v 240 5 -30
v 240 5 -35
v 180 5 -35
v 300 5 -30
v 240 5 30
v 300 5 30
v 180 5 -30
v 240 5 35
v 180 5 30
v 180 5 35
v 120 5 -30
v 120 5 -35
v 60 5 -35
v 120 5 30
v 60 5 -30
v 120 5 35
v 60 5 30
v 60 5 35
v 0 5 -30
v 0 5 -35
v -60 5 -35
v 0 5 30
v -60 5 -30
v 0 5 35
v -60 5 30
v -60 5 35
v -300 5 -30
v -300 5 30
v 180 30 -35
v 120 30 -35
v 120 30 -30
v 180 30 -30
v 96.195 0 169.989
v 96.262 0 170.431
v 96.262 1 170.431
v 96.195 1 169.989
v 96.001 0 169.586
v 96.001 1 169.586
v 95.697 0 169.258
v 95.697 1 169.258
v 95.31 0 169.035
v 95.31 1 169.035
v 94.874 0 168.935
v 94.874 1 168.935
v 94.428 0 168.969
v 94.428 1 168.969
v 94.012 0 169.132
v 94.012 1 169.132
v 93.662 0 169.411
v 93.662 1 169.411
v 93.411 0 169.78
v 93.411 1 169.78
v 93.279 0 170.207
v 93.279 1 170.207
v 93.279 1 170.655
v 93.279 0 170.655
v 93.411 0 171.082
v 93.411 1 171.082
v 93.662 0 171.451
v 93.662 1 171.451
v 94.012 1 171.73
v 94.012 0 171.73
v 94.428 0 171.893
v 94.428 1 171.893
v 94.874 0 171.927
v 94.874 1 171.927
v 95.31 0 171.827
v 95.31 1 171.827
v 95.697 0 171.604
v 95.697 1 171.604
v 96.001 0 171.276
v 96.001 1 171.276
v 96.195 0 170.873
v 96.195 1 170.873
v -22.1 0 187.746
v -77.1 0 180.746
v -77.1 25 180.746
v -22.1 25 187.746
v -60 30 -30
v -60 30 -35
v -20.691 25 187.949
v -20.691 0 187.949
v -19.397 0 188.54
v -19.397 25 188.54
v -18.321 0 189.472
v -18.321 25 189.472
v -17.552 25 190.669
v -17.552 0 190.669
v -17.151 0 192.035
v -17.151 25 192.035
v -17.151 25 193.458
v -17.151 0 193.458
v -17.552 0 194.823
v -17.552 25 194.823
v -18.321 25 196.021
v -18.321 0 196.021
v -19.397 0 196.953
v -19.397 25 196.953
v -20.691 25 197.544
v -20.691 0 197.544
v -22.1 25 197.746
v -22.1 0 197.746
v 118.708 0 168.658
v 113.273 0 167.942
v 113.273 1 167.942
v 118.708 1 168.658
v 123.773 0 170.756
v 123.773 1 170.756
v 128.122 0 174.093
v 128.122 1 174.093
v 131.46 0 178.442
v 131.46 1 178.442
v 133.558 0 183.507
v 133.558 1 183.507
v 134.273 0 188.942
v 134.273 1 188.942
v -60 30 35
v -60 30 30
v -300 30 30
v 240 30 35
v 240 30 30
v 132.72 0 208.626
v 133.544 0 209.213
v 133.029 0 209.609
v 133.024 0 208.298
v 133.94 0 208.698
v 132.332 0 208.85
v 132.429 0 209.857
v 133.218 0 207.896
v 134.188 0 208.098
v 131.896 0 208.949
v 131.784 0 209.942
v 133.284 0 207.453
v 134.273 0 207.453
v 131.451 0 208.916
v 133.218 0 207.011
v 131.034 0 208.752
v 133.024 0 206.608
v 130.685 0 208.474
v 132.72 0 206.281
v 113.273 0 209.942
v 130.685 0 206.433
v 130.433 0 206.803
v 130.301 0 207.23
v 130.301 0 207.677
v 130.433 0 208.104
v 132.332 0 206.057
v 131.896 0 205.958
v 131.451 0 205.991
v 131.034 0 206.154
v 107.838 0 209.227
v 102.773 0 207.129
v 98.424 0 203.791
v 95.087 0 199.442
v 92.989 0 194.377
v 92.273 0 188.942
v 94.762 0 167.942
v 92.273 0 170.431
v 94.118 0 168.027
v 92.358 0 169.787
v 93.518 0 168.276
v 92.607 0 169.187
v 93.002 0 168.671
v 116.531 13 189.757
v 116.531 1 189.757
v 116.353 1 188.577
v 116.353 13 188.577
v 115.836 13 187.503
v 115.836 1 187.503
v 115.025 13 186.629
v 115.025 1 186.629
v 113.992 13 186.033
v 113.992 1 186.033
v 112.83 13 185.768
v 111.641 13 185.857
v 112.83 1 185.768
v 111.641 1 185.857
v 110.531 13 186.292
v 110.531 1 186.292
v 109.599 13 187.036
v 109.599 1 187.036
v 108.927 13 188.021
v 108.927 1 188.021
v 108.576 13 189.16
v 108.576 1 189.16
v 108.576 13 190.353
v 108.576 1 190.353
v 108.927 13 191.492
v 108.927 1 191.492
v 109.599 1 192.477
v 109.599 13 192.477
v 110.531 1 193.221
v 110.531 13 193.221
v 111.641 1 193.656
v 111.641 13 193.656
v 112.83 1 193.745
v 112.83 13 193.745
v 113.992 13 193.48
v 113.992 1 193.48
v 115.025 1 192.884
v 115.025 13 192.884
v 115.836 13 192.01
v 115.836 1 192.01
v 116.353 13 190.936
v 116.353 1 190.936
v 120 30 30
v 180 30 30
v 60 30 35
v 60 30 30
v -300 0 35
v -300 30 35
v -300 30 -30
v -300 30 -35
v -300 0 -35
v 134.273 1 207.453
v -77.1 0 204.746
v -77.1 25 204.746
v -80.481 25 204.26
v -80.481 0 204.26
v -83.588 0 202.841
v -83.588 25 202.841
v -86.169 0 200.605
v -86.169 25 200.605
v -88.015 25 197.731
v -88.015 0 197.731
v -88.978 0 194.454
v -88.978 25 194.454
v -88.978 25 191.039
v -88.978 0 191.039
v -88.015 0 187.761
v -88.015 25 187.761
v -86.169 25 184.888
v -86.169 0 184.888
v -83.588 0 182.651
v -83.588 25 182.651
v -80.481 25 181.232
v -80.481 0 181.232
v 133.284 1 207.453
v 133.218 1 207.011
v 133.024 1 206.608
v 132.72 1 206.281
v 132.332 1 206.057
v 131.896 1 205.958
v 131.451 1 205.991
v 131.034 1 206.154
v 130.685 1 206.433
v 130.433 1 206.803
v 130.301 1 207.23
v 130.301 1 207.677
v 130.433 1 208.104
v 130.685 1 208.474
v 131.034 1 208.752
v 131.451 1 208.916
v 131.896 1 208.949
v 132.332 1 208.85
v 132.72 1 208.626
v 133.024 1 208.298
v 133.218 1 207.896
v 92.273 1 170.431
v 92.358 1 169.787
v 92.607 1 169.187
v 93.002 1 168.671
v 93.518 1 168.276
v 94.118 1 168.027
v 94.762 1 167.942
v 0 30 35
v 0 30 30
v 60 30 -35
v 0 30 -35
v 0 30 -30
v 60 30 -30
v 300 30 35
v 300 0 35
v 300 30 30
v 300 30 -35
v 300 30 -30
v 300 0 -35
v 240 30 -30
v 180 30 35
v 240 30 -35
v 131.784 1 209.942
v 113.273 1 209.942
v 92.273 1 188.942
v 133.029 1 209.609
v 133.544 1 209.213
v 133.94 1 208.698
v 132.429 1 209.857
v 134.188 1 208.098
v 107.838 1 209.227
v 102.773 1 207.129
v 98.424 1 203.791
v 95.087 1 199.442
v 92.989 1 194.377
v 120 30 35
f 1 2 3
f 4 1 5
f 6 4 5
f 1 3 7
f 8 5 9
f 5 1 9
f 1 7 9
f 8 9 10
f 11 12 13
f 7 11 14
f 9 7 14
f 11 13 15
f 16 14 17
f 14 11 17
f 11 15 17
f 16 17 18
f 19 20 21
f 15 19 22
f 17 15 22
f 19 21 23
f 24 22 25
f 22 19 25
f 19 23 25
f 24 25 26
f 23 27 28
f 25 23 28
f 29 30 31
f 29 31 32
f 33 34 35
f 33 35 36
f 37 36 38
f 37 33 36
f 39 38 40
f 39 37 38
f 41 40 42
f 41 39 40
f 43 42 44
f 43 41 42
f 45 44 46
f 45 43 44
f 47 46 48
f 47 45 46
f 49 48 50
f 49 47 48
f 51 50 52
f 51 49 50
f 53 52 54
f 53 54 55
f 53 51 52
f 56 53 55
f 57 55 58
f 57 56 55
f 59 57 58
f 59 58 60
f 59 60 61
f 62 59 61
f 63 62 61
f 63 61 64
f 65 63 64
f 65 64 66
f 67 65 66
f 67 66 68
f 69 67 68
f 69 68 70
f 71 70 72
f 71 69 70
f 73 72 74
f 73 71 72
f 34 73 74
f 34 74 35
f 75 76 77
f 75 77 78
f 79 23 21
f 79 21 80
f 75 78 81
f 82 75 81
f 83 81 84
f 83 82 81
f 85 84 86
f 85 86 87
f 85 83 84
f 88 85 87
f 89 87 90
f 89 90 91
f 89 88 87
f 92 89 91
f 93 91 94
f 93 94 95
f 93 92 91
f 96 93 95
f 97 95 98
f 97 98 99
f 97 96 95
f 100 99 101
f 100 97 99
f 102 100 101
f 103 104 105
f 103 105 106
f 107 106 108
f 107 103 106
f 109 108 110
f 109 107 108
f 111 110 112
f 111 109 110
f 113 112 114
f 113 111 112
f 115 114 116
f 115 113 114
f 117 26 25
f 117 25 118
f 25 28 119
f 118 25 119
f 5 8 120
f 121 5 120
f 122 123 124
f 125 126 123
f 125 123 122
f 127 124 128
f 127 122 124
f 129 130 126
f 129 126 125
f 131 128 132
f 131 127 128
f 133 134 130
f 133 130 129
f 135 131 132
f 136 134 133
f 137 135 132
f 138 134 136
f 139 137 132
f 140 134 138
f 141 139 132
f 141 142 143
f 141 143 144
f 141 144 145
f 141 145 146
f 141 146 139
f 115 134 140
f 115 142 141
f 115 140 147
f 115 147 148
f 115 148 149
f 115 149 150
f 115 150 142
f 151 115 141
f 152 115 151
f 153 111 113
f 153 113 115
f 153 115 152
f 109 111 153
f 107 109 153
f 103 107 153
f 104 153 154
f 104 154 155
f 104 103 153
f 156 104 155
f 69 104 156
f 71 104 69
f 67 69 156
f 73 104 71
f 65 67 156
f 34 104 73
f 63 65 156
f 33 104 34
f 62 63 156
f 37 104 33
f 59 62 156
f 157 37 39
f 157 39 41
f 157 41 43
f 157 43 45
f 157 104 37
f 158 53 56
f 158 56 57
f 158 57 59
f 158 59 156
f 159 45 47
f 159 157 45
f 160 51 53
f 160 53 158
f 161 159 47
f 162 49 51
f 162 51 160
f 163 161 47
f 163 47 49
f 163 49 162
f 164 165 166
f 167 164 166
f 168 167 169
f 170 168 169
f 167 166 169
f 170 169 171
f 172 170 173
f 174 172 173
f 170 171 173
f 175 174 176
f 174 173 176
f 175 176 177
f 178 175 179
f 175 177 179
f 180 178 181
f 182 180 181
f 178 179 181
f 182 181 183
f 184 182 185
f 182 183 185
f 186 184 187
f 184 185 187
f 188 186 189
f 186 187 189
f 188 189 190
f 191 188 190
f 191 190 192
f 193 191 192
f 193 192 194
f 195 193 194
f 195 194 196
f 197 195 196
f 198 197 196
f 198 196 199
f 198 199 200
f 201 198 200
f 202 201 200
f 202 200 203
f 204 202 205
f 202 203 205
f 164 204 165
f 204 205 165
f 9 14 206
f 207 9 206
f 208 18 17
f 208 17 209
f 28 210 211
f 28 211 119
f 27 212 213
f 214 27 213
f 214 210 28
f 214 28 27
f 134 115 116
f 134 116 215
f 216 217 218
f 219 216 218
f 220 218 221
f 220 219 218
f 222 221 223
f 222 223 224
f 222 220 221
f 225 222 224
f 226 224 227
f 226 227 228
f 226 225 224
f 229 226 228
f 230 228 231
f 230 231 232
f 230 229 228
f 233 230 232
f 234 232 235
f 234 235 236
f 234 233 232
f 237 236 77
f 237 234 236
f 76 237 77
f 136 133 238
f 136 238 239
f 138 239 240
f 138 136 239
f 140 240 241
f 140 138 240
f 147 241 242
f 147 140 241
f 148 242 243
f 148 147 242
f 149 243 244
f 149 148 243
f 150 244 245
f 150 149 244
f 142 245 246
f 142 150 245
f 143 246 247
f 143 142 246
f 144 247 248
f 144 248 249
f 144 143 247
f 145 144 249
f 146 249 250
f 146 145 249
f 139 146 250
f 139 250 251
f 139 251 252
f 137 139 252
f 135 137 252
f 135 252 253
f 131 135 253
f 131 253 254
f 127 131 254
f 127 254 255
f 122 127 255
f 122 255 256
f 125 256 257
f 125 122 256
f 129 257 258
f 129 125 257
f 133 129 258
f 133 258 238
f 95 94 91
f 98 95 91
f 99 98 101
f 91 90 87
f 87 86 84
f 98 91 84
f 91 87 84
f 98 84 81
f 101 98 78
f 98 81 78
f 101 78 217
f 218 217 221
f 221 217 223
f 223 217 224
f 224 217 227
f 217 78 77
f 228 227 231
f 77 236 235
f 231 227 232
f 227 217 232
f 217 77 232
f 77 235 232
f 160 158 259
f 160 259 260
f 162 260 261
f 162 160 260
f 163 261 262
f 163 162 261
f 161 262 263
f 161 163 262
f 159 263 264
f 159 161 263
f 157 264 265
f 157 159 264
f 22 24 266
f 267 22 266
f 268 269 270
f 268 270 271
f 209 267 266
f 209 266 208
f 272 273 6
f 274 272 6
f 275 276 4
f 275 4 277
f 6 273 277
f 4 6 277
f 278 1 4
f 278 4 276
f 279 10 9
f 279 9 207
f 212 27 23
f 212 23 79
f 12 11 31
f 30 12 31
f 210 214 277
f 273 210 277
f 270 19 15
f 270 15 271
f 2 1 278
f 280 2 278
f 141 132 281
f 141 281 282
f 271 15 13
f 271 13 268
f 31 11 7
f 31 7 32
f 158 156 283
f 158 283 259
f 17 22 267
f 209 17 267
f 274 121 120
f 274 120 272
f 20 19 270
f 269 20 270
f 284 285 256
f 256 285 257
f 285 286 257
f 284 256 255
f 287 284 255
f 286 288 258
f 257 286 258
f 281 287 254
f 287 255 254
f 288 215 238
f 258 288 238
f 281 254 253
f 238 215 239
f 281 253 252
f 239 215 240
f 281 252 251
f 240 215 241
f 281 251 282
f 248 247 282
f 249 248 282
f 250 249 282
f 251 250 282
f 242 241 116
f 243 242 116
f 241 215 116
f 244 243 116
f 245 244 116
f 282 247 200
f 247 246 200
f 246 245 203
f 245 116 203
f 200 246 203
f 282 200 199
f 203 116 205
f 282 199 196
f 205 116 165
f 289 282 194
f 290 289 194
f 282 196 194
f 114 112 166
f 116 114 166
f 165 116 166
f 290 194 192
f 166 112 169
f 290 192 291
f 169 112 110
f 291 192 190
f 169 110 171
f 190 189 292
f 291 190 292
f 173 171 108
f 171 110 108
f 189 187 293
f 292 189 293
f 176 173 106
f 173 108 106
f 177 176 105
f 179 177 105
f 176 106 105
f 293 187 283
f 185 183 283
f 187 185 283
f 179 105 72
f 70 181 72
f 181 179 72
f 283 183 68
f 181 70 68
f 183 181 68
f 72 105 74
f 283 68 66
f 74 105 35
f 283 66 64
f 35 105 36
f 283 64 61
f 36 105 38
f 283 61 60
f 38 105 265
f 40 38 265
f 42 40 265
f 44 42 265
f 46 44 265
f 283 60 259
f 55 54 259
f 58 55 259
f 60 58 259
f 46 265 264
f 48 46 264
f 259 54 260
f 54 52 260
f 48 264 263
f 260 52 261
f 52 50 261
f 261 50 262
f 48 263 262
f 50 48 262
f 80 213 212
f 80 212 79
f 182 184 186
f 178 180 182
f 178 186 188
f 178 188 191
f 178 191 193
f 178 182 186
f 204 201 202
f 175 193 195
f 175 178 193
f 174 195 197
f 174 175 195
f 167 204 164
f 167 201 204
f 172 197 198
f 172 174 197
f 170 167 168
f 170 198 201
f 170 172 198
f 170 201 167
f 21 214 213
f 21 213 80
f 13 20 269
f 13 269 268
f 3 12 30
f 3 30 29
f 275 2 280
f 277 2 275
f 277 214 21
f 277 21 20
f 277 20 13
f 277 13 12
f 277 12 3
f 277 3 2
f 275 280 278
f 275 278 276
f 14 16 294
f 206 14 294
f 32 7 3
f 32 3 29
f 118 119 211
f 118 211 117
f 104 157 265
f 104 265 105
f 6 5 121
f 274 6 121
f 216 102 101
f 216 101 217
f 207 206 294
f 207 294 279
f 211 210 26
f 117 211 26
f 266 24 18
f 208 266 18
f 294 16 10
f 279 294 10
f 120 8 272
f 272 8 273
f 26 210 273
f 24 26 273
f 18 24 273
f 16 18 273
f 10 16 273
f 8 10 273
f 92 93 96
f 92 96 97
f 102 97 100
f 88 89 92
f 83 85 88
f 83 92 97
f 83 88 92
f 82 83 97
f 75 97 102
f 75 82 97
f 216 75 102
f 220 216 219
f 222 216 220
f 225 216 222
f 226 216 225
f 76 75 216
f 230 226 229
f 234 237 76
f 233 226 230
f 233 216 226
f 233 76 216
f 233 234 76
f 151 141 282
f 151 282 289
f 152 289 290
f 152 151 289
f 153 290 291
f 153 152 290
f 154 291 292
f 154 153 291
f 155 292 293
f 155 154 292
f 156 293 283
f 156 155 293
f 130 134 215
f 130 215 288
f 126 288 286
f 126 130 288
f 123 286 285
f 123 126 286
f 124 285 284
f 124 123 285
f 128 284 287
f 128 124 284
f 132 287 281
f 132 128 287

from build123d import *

# Parameters (mm, degrees)
SKETCH1_W           = 600
SKETCH1_H           = 70
BOSS_EXTRUDE1_DEPTH = 30
SKETCH3_W           = 60
SKETCH3_H           = 25
CUT_EXTRUDE2_DEPTH  = 600
SKETCH4_W           = 60
SKETCH4_H           = 25
CUT_EXTRUDE3_DEPTH  = 70
SKETCH10_W          = 60
SKETCH10_H          = 25
CUT_EXTRUDE5_DEPTH  = 70
BOSS_EXTRUDE4_DEPTH = 25
SKETCH13_R          = 1.5
BOSS_EXTRUDE5_DEPTH = 1
SKETCH14_R          = 4
BOSS_EXTRUDE6_DEPTH = 12


with BuildPart() as part:
    # Sketch1 → Boss-Extrude1 (new body)
    with BuildSketch(Plane(origin=(0, 0, 0), x_dir=(1, 0, 0), z_dir=(0, 1, 0))):
        Rectangle(SKETCH1_W, SKETCH1_H)
    extrude(amount=BOSS_EXTRUDE1_DEPTH)

    # Sketch3 → Cut-Extrude2 (cut)
    with BuildSketch(Plane.ZY.offset(300)):
        with Locations((0, 17.5)):
            Rectangle(SKETCH3_W, SKETCH3_H)
    extrude(amount=-CUT_EXTRUDE2_DEPTH, mode=Mode.SUBTRACT)

    # Sketch4 → Cut-Extrude3 (cut)
    with BuildSketch(Plane.XY.offset(35)):
        with Locations((210, 17.5)):
            Rectangle(SKETCH4_W, SKETCH4_H)
    extrude(amount=-CUT_EXTRUDE3_DEPTH, mode=Mode.SUBTRACT)

    # Sketch10 → Cut-Extrude5 (cut)
    with BuildSketch(Plane.XY.offset(35)):
        with Locations((90, 17.5)):
            Rectangle(SKETCH10_W, SKETCH10_H)
        with Locations((-30, 17.5)):
            Rectangle(SKETCH10_W, SKETCH10_H)
    extrude(amount=-CUT_EXTRUDE5_DEPTH, mode=Mode.SUBTRACT)


with BuildPart() as body_2:
    # Sketch11 → Boss-Extrude4 (new body)
    with BuildSketch(Plane(origin=(0, 0, 0), x_dir=(1, 0, 0), z_dir=(0, 1, 0))):
        with BuildLine():
            Line((-77.099833846, -180.746319388), (-22.099833846, -187.746319388))
            ThreePointArc((-22.099833846, -187.746319388), (-17.099833846, -192.746319388), (-22.099833846, -197.746319388))
            Line((-22.099833846, -197.746319388), (-77.099833846, -204.746319388))
            ThreePointArc((-77.099833846, -204.746319388), (-89.099833846, -192.746319388), (-77.099833846, -180.746319388))
        make_face()
    extrude(amount=BOSS_EXTRUDE4_DEPTH)


with BuildPart() as body_3:
    # Sketch13 → Boss-Extrude5 (new body)
    with BuildSketch(Plane(origin=(0, 0, 0), x_dir=(1, 0, 0), z_dir=(0, 1, 0))):
        with BuildLine():
            Line((94.761994393, -167.942193968), (113.27317523, -167.942193968))
            ThreePointArc((113.27317523, -167.942193968), (128.122417635, -174.092951563), (134.27317523, -188.942193968))
            Line((134.27317523, -188.942193968), (134.27317523, -207.453374805))
            ThreePointArc((134.27317523, -207.453374805), (133.544216975, -209.213235712), (131.784356068, -209.942193968))
            Line((131.784356068, -209.942193968), (113.27317523, -209.942193968))
            ThreePointArc((113.27317523, -209.942193968), (98.423932826, -203.791436372), (92.27317523, -188.942193968))
            Line((92.27317523, -188.942193968), (92.27317523, -170.43101313))
            ThreePointArc((92.27317523, -170.43101313), (93.002133486, -168.671152223), (94.761994393, -167.942193968))
        make_face()
        with Locations((94.761994393, -170.43101313)):
            Circle(SKETCH13_R, mode=Mode.SUBTRACT)
        with Locations((131.784356068, -207.453374805)):
            Circle(SKETCH13_R, mode=Mode.SUBTRACT)
    extrude(amount=BOSS_EXTRUDE5_DEPTH)

    # Sketch14 → Boss-Extrude6 (add)
    with BuildSketch(Plane(origin=(0, 1, 0), x_dir=(1, 0, 0), z_dir=(0, 1, 0))):
        with Locations((112.531105399, -189.756511726)):
            Circle(SKETCH14_R)
    extrude(amount=BOSS_EXTRUDE6_DEPTH)


solid = Compound([part.part, body_2.part, body_3.part])
